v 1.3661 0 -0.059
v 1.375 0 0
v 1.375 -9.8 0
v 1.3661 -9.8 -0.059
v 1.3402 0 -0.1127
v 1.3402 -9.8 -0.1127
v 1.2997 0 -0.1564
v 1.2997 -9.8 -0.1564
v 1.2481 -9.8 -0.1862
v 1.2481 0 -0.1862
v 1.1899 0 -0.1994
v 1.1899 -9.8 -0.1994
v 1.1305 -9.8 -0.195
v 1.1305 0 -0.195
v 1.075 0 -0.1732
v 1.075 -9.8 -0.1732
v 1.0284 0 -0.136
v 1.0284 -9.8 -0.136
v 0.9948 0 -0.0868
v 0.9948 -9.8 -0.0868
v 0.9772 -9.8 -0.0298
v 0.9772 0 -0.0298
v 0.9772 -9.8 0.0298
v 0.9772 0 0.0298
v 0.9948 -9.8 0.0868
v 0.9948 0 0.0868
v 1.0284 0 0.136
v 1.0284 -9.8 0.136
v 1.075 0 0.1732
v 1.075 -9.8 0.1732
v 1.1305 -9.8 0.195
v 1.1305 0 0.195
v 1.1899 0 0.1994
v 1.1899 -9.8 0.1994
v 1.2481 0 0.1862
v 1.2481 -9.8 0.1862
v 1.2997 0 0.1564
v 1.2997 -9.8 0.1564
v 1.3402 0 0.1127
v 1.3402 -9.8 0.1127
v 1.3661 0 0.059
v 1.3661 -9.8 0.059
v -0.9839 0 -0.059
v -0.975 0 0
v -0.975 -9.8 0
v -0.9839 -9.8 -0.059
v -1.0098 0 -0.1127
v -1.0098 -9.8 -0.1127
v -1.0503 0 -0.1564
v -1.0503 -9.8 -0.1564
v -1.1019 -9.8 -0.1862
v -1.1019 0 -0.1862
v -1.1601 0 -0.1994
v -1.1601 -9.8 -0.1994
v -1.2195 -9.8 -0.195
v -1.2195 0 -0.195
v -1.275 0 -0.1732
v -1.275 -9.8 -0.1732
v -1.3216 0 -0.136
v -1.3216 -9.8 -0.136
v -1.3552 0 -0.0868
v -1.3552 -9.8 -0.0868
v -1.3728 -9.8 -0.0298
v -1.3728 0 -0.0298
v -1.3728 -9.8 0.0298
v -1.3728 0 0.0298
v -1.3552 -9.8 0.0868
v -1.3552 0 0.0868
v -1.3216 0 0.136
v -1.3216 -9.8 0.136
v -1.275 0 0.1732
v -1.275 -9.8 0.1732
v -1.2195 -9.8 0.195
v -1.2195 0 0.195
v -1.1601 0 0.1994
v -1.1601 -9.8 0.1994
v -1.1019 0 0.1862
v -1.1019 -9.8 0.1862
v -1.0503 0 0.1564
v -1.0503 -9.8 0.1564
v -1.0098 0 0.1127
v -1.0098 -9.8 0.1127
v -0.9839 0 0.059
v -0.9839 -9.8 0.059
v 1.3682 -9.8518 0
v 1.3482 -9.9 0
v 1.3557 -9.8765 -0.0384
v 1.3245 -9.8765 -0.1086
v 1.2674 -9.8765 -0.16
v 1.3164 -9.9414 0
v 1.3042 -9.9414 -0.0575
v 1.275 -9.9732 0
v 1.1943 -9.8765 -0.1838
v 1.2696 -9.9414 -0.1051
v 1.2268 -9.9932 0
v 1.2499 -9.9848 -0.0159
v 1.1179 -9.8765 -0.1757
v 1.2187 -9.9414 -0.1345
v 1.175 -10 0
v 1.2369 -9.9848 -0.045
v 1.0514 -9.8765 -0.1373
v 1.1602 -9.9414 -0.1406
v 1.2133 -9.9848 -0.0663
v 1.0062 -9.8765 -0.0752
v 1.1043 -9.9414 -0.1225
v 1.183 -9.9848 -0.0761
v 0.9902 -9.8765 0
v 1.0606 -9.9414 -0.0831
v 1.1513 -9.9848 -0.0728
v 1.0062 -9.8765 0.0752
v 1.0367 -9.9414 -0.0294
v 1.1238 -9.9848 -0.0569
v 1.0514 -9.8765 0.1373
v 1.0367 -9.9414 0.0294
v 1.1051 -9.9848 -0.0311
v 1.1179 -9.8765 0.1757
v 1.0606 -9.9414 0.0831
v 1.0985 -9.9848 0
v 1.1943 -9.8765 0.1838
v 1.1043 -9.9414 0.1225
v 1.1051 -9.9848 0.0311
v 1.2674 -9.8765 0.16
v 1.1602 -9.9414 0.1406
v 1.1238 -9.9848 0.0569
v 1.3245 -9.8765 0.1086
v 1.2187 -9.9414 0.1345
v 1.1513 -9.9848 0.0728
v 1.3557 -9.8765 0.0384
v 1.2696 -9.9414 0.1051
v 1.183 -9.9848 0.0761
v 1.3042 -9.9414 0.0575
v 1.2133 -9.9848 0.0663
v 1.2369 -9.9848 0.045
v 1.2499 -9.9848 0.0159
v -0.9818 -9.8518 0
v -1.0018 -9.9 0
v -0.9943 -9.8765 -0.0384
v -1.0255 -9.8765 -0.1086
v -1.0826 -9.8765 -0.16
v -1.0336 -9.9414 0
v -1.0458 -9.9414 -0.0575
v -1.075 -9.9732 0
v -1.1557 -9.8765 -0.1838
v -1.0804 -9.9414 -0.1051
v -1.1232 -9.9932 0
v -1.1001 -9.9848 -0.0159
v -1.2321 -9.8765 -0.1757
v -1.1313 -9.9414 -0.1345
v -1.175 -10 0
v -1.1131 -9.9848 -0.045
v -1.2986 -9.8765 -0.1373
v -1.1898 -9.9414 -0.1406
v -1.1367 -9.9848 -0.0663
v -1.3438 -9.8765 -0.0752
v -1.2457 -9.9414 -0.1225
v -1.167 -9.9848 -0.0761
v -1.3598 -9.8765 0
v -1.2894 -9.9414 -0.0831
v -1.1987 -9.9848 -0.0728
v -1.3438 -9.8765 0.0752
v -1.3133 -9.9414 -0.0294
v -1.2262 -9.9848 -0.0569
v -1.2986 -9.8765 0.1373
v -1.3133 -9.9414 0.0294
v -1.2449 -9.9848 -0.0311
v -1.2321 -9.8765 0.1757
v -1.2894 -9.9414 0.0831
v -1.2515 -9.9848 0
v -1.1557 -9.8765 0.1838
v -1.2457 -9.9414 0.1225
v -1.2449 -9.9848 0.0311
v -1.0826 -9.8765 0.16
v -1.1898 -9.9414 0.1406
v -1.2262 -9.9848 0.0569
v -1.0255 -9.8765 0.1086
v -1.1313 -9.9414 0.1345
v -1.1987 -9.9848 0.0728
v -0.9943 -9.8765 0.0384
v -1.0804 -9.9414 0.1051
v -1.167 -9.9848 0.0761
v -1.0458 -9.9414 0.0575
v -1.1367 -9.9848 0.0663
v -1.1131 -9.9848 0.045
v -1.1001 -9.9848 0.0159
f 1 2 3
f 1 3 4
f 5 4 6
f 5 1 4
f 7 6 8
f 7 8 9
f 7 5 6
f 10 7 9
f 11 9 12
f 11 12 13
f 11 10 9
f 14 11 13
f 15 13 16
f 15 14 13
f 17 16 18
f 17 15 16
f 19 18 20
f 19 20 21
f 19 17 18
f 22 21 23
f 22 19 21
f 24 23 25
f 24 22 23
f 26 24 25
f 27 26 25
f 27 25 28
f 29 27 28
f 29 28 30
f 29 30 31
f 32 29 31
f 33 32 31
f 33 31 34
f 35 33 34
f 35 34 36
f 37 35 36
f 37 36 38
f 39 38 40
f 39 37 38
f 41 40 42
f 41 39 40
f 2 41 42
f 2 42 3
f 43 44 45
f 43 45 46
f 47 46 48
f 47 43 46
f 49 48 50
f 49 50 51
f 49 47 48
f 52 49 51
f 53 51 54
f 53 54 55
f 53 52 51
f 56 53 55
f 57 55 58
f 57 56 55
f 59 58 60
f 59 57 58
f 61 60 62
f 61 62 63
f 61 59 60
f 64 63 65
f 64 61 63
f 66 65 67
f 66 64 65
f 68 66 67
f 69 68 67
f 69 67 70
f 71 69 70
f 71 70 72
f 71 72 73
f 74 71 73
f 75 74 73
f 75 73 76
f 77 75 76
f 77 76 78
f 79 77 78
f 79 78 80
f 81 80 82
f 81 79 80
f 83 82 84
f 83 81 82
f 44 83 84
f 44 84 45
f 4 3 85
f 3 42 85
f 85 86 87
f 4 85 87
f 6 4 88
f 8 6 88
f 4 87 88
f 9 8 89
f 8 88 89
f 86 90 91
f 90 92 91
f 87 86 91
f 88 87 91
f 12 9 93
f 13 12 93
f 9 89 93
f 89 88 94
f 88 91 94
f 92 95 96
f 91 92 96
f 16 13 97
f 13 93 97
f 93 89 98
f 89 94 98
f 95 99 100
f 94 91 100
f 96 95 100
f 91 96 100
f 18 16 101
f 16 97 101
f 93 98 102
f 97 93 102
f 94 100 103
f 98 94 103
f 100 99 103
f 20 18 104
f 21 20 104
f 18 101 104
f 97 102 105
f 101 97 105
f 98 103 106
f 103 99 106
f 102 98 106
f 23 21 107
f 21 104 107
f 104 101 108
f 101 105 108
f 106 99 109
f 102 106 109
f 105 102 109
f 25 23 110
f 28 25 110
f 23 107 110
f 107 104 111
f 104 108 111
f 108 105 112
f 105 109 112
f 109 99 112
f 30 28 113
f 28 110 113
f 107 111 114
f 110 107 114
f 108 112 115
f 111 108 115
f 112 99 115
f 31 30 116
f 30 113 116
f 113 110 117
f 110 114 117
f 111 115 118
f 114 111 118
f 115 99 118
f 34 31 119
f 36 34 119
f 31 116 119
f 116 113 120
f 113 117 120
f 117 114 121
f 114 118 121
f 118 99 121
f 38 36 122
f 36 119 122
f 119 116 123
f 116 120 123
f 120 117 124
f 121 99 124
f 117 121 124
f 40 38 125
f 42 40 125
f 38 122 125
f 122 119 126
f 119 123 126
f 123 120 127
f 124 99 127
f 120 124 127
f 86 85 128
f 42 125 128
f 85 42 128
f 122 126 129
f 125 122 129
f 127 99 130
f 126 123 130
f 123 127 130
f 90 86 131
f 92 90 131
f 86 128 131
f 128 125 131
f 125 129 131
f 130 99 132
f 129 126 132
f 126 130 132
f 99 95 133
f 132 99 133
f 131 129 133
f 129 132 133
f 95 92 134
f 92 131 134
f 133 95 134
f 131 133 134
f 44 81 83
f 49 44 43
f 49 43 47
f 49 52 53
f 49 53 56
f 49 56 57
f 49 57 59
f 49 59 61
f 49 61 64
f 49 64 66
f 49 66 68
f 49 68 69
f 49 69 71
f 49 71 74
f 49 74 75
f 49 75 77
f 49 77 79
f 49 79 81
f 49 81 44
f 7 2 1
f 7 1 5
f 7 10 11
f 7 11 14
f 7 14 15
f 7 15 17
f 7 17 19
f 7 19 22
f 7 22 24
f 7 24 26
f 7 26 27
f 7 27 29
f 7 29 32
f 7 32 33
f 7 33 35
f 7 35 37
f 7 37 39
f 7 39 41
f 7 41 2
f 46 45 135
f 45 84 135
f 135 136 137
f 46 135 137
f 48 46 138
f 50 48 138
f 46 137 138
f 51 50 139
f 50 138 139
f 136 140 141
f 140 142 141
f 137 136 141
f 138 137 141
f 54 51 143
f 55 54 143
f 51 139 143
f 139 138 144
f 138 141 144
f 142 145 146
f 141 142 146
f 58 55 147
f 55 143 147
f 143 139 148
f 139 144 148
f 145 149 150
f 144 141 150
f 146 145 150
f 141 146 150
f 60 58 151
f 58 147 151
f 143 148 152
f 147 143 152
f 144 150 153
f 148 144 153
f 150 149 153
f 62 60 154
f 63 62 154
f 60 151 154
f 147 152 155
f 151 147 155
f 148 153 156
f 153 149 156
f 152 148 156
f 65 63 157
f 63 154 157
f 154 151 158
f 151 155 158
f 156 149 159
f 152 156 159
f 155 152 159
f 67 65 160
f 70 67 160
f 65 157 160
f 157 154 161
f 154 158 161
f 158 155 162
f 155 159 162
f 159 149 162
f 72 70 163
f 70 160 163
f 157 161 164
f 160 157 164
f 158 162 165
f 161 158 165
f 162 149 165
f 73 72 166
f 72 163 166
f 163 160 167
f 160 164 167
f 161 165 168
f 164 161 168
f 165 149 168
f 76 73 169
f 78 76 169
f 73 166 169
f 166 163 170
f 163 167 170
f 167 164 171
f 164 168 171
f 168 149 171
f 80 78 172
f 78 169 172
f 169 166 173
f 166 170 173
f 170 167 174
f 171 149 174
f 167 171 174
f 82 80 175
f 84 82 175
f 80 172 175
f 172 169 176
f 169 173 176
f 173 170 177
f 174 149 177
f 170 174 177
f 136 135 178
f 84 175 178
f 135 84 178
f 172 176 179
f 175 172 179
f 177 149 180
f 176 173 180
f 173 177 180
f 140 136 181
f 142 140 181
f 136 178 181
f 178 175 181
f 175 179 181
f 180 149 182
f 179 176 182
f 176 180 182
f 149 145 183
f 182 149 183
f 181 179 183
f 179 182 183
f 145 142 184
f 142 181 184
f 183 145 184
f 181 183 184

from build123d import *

# Parameters (mm, degrees)
SKETCH3_R             = 0.2
BOSS_EXTRUDE1_DEPTH   = 10
BOSS_EXTRUDE1_2_DEPTH = 10
FILLET3_R             = 0.2
FILLET4_R             = 0.2


with BuildPart() as part:
    # Sketch3 → Boss-Extrude1 (new body)
    with BuildSketch(Plane(origin=(0, 0, 0), x_dir=(1, 0, 0), z_dir=(0, 1, 0))):
        with Locations((1.175, 0)):
            Circle(SKETCH3_R)
    extrude(amount=-BOSS_EXTRUDE1_DEPTH)

    # Fillet3
    fillet3_edges = [part.edges().sort_by_distance(p)[0] for p in [
        (0.975, -10, 0),
    ]]
    fillet(fillet3_edges, radius=FILLET3_R)


with BuildPart() as body_2:
    # Sketch3 → Boss-Extrude1 2 (new body)
    with BuildSketch(Plane(origin=(0, 0, 0), x_dir=(1, 0, 0), z_dir=(0, 1, 0))):
        with Locations((-1.175, 0)):
            Circle(SKETCH3_R)
    extrude(amount=-BOSS_EXTRUDE1_2_DEPTH)

    # Fillet4
    fillet4_edges = [body_2.edges().sort_by_distance(p)[0] for p in [
        (-1.375, -10, 0),
    ]]
    fillet(fillet4_edges, radius=FILLET4_R)


solid = Compound([part.part, body_2.part])
